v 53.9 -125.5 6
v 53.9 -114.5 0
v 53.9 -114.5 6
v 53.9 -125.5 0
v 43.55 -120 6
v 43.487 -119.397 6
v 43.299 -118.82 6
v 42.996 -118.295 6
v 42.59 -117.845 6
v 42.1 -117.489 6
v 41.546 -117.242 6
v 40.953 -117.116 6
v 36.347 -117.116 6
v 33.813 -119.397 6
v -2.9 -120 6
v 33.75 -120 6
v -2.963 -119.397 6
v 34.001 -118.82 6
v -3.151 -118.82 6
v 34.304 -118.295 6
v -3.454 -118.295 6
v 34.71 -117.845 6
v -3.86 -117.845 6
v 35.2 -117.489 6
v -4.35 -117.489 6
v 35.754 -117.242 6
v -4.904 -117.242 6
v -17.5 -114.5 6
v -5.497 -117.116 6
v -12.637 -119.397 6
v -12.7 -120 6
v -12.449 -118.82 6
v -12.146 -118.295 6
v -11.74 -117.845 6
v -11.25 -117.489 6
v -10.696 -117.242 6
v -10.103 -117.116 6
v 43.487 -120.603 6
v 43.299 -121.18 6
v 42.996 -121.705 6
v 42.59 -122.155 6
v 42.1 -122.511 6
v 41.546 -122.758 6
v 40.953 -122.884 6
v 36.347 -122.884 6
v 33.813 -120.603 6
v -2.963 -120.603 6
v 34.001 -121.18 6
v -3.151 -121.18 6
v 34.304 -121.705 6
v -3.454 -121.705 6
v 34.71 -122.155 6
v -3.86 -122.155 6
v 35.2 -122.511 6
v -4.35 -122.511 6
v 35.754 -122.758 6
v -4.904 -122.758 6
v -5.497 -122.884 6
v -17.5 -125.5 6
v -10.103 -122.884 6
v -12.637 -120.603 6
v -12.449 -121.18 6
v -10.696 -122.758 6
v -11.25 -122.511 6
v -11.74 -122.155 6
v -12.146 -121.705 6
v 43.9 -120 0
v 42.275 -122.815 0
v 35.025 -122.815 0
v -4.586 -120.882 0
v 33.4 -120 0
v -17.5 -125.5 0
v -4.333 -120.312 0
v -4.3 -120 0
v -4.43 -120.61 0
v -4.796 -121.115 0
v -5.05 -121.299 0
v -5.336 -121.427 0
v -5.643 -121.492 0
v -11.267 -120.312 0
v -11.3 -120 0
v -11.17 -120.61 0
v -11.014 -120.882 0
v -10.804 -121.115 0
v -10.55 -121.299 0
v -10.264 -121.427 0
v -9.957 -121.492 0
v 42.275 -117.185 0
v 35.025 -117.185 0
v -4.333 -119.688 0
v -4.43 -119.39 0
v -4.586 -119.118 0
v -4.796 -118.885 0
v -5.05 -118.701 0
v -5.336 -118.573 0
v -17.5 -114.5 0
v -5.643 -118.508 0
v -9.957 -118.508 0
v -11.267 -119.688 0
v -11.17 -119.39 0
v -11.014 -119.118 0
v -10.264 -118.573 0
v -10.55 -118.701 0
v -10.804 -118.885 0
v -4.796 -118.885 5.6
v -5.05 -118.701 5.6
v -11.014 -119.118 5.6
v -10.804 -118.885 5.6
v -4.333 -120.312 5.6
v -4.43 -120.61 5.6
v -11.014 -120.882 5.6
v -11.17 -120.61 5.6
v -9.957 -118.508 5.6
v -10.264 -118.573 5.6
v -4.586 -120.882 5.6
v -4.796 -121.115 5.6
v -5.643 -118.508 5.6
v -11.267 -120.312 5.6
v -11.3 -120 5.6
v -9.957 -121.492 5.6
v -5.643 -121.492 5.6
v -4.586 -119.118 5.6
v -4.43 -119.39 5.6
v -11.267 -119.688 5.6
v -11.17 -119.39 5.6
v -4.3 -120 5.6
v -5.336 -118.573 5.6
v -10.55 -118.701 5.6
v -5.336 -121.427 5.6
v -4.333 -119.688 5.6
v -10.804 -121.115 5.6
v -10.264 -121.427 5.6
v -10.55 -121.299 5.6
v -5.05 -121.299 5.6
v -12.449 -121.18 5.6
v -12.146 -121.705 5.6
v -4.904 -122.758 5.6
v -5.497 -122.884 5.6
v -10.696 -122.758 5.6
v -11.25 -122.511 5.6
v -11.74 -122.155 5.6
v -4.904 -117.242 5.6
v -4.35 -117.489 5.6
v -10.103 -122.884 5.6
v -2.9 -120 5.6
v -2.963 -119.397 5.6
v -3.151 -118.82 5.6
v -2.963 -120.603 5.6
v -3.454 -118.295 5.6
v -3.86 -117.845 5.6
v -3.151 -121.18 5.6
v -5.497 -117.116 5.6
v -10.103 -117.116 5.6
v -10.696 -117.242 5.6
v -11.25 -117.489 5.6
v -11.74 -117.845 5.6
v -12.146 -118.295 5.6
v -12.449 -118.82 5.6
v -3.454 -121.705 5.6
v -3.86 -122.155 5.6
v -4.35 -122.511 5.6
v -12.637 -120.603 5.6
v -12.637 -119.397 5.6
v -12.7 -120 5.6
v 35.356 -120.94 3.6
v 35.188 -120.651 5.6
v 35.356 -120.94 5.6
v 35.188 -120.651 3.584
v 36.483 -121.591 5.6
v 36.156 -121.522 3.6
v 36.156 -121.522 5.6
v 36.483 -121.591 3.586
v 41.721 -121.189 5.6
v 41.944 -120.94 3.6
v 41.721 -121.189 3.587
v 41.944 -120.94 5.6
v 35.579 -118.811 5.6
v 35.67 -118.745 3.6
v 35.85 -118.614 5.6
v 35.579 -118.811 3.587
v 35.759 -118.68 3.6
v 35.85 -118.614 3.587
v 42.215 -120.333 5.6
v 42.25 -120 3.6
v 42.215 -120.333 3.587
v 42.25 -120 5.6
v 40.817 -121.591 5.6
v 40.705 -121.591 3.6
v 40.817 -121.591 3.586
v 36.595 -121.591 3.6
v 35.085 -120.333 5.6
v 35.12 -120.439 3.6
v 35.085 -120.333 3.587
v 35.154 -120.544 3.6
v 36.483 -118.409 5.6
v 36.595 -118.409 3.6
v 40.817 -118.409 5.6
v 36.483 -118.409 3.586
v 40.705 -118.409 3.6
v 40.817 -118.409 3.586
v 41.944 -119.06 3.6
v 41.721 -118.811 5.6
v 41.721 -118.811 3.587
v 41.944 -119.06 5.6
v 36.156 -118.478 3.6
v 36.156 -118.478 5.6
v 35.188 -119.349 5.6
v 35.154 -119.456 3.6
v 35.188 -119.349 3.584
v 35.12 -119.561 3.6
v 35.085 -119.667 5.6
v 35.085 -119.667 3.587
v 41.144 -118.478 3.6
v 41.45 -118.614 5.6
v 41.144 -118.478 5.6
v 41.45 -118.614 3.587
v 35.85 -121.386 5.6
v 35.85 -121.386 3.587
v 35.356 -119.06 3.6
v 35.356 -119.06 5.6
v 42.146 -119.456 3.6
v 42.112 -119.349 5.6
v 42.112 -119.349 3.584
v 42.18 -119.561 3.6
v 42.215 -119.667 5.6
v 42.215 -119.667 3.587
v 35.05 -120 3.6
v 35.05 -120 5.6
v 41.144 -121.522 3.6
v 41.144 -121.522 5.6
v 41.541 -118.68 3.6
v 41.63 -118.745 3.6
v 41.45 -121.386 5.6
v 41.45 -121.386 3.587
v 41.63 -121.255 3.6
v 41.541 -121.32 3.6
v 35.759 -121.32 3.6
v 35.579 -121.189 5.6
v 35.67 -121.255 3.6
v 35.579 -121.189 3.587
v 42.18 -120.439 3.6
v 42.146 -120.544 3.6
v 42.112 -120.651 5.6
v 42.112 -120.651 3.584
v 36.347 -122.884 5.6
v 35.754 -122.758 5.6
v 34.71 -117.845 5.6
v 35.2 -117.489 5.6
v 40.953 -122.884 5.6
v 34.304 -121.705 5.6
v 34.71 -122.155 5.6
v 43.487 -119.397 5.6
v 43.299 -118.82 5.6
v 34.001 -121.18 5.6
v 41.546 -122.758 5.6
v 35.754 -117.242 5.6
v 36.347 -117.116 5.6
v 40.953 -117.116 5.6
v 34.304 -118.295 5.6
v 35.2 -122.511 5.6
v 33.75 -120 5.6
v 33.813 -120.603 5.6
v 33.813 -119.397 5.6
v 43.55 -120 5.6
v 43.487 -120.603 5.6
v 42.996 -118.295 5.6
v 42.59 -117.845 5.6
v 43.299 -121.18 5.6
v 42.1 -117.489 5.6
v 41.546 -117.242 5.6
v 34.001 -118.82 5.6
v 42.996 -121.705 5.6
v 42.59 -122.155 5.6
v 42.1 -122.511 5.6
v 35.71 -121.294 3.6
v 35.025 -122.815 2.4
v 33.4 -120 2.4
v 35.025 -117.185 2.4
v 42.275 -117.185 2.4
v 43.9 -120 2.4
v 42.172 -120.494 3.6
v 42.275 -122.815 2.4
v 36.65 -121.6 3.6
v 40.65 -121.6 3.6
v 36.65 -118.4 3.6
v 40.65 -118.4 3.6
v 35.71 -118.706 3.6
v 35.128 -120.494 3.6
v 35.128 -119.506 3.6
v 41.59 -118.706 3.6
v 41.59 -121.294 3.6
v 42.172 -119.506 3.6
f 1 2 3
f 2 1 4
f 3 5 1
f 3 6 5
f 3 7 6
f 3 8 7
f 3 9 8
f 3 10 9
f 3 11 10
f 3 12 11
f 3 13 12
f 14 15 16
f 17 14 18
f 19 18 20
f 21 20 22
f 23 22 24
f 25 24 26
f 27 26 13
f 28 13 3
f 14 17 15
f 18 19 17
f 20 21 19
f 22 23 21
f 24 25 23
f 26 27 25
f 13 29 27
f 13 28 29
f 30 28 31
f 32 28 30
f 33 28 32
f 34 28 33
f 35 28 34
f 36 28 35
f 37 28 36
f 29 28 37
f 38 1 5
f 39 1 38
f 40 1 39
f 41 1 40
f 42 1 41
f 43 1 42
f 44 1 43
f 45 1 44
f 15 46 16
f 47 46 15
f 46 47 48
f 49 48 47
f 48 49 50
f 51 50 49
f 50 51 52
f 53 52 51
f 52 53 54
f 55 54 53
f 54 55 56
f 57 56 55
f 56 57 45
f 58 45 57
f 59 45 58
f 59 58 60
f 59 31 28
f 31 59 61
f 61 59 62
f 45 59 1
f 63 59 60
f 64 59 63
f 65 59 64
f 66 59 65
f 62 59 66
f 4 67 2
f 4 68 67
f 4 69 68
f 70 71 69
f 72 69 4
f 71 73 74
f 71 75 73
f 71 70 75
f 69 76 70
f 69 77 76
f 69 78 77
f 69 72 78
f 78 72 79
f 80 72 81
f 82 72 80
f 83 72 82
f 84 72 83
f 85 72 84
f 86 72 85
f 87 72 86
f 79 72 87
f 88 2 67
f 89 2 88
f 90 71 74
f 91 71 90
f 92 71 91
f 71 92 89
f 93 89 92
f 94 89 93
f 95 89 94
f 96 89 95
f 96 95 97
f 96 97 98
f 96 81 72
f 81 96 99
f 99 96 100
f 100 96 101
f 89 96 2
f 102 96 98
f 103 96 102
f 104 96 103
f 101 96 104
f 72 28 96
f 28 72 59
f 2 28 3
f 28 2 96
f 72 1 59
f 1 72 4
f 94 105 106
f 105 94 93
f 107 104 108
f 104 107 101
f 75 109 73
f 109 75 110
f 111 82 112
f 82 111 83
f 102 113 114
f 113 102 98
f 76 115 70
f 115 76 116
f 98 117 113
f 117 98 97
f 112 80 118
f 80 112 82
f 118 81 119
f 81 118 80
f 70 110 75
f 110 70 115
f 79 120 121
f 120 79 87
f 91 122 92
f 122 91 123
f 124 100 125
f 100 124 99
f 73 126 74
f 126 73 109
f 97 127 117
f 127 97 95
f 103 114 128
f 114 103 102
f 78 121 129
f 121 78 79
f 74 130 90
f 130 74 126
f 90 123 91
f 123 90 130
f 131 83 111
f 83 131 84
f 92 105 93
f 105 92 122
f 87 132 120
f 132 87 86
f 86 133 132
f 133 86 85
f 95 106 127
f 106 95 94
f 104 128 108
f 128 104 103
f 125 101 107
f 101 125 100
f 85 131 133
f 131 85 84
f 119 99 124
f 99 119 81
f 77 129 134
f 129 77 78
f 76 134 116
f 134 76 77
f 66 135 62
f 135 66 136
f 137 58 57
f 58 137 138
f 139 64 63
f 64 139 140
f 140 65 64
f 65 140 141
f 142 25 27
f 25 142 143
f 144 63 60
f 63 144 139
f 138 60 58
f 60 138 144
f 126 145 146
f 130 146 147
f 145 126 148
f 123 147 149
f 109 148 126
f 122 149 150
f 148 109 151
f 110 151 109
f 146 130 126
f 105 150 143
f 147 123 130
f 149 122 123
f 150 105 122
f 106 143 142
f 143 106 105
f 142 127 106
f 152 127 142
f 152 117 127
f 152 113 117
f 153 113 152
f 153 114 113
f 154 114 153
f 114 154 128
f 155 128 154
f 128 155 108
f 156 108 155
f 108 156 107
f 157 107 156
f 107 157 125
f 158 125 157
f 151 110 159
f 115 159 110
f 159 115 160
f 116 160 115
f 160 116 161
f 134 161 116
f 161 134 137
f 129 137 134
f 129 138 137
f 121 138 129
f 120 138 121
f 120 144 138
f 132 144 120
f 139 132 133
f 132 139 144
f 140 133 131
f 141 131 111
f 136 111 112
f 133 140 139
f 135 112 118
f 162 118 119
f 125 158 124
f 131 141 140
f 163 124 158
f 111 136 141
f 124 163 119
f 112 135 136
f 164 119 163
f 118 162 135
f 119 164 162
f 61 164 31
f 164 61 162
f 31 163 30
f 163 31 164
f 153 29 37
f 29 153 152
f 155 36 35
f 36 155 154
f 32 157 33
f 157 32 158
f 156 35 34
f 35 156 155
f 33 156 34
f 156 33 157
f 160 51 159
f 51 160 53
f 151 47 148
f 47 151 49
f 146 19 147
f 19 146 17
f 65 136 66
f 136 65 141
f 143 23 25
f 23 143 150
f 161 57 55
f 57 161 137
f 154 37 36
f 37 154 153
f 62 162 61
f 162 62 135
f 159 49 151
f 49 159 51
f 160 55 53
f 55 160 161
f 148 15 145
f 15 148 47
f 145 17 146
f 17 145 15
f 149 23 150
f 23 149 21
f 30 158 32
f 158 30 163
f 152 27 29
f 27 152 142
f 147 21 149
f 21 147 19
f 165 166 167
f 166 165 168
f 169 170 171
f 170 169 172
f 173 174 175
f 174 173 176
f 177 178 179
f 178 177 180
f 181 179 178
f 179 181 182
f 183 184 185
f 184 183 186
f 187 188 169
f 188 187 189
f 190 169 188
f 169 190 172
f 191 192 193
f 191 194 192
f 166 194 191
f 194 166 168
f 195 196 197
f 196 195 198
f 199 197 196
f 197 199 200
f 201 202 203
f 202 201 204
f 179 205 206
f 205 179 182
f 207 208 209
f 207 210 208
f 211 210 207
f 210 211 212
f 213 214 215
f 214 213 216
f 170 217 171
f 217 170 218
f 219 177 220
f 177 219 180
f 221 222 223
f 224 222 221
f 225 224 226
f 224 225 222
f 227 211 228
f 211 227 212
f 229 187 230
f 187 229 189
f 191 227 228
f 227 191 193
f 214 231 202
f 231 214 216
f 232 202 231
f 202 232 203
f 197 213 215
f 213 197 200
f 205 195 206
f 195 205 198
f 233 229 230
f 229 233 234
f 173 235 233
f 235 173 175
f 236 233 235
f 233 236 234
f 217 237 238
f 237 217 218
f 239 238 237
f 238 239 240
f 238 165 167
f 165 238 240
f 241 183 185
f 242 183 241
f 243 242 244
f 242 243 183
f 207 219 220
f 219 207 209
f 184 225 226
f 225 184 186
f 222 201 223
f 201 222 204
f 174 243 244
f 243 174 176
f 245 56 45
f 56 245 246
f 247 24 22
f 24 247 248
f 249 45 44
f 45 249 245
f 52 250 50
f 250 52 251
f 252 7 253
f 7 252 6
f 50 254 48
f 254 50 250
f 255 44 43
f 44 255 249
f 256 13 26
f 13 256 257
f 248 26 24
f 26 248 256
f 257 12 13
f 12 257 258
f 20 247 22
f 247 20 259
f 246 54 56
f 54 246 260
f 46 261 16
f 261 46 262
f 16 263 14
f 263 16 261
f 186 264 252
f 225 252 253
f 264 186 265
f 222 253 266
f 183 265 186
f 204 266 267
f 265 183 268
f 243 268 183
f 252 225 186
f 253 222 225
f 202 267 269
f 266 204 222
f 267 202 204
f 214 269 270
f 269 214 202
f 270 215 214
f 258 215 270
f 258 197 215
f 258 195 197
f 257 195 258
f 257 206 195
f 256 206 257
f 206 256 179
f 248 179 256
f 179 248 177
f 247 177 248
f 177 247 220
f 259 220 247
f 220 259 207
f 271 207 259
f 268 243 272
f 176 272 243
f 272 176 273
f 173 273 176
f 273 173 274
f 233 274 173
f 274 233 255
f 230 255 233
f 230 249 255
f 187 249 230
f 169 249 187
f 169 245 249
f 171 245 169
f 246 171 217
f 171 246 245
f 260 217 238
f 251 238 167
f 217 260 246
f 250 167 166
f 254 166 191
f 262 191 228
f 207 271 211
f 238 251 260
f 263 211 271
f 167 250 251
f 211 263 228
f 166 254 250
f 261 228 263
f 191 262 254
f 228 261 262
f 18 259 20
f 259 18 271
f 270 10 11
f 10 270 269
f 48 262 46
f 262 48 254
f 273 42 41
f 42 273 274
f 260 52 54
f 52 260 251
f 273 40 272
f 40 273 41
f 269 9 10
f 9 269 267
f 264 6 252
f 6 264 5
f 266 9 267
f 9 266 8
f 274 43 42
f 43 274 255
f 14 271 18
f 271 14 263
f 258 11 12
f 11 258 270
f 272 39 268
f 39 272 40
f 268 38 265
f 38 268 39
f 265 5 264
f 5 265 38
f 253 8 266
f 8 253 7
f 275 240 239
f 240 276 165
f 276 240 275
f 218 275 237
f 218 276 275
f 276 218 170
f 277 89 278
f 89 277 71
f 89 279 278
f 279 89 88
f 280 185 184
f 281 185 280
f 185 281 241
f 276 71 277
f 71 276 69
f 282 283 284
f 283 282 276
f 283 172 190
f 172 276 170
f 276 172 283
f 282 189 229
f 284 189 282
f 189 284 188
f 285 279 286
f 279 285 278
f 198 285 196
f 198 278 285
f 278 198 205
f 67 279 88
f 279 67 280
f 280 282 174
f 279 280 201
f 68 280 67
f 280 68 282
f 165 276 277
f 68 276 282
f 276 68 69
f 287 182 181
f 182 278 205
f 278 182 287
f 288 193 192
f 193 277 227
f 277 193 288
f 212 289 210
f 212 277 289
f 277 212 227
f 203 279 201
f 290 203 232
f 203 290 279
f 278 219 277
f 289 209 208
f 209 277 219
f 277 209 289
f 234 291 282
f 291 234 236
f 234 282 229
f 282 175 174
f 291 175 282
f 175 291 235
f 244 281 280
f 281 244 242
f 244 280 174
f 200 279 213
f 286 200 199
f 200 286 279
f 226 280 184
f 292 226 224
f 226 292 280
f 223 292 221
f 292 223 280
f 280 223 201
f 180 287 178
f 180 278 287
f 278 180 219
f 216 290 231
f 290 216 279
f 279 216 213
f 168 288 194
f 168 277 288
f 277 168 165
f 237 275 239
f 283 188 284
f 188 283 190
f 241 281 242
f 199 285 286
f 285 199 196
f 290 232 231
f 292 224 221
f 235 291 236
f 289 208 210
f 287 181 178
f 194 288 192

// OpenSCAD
use <bed_carriage.scad>

height = 12;
translate([-40,-120,0]) motor_arm();
